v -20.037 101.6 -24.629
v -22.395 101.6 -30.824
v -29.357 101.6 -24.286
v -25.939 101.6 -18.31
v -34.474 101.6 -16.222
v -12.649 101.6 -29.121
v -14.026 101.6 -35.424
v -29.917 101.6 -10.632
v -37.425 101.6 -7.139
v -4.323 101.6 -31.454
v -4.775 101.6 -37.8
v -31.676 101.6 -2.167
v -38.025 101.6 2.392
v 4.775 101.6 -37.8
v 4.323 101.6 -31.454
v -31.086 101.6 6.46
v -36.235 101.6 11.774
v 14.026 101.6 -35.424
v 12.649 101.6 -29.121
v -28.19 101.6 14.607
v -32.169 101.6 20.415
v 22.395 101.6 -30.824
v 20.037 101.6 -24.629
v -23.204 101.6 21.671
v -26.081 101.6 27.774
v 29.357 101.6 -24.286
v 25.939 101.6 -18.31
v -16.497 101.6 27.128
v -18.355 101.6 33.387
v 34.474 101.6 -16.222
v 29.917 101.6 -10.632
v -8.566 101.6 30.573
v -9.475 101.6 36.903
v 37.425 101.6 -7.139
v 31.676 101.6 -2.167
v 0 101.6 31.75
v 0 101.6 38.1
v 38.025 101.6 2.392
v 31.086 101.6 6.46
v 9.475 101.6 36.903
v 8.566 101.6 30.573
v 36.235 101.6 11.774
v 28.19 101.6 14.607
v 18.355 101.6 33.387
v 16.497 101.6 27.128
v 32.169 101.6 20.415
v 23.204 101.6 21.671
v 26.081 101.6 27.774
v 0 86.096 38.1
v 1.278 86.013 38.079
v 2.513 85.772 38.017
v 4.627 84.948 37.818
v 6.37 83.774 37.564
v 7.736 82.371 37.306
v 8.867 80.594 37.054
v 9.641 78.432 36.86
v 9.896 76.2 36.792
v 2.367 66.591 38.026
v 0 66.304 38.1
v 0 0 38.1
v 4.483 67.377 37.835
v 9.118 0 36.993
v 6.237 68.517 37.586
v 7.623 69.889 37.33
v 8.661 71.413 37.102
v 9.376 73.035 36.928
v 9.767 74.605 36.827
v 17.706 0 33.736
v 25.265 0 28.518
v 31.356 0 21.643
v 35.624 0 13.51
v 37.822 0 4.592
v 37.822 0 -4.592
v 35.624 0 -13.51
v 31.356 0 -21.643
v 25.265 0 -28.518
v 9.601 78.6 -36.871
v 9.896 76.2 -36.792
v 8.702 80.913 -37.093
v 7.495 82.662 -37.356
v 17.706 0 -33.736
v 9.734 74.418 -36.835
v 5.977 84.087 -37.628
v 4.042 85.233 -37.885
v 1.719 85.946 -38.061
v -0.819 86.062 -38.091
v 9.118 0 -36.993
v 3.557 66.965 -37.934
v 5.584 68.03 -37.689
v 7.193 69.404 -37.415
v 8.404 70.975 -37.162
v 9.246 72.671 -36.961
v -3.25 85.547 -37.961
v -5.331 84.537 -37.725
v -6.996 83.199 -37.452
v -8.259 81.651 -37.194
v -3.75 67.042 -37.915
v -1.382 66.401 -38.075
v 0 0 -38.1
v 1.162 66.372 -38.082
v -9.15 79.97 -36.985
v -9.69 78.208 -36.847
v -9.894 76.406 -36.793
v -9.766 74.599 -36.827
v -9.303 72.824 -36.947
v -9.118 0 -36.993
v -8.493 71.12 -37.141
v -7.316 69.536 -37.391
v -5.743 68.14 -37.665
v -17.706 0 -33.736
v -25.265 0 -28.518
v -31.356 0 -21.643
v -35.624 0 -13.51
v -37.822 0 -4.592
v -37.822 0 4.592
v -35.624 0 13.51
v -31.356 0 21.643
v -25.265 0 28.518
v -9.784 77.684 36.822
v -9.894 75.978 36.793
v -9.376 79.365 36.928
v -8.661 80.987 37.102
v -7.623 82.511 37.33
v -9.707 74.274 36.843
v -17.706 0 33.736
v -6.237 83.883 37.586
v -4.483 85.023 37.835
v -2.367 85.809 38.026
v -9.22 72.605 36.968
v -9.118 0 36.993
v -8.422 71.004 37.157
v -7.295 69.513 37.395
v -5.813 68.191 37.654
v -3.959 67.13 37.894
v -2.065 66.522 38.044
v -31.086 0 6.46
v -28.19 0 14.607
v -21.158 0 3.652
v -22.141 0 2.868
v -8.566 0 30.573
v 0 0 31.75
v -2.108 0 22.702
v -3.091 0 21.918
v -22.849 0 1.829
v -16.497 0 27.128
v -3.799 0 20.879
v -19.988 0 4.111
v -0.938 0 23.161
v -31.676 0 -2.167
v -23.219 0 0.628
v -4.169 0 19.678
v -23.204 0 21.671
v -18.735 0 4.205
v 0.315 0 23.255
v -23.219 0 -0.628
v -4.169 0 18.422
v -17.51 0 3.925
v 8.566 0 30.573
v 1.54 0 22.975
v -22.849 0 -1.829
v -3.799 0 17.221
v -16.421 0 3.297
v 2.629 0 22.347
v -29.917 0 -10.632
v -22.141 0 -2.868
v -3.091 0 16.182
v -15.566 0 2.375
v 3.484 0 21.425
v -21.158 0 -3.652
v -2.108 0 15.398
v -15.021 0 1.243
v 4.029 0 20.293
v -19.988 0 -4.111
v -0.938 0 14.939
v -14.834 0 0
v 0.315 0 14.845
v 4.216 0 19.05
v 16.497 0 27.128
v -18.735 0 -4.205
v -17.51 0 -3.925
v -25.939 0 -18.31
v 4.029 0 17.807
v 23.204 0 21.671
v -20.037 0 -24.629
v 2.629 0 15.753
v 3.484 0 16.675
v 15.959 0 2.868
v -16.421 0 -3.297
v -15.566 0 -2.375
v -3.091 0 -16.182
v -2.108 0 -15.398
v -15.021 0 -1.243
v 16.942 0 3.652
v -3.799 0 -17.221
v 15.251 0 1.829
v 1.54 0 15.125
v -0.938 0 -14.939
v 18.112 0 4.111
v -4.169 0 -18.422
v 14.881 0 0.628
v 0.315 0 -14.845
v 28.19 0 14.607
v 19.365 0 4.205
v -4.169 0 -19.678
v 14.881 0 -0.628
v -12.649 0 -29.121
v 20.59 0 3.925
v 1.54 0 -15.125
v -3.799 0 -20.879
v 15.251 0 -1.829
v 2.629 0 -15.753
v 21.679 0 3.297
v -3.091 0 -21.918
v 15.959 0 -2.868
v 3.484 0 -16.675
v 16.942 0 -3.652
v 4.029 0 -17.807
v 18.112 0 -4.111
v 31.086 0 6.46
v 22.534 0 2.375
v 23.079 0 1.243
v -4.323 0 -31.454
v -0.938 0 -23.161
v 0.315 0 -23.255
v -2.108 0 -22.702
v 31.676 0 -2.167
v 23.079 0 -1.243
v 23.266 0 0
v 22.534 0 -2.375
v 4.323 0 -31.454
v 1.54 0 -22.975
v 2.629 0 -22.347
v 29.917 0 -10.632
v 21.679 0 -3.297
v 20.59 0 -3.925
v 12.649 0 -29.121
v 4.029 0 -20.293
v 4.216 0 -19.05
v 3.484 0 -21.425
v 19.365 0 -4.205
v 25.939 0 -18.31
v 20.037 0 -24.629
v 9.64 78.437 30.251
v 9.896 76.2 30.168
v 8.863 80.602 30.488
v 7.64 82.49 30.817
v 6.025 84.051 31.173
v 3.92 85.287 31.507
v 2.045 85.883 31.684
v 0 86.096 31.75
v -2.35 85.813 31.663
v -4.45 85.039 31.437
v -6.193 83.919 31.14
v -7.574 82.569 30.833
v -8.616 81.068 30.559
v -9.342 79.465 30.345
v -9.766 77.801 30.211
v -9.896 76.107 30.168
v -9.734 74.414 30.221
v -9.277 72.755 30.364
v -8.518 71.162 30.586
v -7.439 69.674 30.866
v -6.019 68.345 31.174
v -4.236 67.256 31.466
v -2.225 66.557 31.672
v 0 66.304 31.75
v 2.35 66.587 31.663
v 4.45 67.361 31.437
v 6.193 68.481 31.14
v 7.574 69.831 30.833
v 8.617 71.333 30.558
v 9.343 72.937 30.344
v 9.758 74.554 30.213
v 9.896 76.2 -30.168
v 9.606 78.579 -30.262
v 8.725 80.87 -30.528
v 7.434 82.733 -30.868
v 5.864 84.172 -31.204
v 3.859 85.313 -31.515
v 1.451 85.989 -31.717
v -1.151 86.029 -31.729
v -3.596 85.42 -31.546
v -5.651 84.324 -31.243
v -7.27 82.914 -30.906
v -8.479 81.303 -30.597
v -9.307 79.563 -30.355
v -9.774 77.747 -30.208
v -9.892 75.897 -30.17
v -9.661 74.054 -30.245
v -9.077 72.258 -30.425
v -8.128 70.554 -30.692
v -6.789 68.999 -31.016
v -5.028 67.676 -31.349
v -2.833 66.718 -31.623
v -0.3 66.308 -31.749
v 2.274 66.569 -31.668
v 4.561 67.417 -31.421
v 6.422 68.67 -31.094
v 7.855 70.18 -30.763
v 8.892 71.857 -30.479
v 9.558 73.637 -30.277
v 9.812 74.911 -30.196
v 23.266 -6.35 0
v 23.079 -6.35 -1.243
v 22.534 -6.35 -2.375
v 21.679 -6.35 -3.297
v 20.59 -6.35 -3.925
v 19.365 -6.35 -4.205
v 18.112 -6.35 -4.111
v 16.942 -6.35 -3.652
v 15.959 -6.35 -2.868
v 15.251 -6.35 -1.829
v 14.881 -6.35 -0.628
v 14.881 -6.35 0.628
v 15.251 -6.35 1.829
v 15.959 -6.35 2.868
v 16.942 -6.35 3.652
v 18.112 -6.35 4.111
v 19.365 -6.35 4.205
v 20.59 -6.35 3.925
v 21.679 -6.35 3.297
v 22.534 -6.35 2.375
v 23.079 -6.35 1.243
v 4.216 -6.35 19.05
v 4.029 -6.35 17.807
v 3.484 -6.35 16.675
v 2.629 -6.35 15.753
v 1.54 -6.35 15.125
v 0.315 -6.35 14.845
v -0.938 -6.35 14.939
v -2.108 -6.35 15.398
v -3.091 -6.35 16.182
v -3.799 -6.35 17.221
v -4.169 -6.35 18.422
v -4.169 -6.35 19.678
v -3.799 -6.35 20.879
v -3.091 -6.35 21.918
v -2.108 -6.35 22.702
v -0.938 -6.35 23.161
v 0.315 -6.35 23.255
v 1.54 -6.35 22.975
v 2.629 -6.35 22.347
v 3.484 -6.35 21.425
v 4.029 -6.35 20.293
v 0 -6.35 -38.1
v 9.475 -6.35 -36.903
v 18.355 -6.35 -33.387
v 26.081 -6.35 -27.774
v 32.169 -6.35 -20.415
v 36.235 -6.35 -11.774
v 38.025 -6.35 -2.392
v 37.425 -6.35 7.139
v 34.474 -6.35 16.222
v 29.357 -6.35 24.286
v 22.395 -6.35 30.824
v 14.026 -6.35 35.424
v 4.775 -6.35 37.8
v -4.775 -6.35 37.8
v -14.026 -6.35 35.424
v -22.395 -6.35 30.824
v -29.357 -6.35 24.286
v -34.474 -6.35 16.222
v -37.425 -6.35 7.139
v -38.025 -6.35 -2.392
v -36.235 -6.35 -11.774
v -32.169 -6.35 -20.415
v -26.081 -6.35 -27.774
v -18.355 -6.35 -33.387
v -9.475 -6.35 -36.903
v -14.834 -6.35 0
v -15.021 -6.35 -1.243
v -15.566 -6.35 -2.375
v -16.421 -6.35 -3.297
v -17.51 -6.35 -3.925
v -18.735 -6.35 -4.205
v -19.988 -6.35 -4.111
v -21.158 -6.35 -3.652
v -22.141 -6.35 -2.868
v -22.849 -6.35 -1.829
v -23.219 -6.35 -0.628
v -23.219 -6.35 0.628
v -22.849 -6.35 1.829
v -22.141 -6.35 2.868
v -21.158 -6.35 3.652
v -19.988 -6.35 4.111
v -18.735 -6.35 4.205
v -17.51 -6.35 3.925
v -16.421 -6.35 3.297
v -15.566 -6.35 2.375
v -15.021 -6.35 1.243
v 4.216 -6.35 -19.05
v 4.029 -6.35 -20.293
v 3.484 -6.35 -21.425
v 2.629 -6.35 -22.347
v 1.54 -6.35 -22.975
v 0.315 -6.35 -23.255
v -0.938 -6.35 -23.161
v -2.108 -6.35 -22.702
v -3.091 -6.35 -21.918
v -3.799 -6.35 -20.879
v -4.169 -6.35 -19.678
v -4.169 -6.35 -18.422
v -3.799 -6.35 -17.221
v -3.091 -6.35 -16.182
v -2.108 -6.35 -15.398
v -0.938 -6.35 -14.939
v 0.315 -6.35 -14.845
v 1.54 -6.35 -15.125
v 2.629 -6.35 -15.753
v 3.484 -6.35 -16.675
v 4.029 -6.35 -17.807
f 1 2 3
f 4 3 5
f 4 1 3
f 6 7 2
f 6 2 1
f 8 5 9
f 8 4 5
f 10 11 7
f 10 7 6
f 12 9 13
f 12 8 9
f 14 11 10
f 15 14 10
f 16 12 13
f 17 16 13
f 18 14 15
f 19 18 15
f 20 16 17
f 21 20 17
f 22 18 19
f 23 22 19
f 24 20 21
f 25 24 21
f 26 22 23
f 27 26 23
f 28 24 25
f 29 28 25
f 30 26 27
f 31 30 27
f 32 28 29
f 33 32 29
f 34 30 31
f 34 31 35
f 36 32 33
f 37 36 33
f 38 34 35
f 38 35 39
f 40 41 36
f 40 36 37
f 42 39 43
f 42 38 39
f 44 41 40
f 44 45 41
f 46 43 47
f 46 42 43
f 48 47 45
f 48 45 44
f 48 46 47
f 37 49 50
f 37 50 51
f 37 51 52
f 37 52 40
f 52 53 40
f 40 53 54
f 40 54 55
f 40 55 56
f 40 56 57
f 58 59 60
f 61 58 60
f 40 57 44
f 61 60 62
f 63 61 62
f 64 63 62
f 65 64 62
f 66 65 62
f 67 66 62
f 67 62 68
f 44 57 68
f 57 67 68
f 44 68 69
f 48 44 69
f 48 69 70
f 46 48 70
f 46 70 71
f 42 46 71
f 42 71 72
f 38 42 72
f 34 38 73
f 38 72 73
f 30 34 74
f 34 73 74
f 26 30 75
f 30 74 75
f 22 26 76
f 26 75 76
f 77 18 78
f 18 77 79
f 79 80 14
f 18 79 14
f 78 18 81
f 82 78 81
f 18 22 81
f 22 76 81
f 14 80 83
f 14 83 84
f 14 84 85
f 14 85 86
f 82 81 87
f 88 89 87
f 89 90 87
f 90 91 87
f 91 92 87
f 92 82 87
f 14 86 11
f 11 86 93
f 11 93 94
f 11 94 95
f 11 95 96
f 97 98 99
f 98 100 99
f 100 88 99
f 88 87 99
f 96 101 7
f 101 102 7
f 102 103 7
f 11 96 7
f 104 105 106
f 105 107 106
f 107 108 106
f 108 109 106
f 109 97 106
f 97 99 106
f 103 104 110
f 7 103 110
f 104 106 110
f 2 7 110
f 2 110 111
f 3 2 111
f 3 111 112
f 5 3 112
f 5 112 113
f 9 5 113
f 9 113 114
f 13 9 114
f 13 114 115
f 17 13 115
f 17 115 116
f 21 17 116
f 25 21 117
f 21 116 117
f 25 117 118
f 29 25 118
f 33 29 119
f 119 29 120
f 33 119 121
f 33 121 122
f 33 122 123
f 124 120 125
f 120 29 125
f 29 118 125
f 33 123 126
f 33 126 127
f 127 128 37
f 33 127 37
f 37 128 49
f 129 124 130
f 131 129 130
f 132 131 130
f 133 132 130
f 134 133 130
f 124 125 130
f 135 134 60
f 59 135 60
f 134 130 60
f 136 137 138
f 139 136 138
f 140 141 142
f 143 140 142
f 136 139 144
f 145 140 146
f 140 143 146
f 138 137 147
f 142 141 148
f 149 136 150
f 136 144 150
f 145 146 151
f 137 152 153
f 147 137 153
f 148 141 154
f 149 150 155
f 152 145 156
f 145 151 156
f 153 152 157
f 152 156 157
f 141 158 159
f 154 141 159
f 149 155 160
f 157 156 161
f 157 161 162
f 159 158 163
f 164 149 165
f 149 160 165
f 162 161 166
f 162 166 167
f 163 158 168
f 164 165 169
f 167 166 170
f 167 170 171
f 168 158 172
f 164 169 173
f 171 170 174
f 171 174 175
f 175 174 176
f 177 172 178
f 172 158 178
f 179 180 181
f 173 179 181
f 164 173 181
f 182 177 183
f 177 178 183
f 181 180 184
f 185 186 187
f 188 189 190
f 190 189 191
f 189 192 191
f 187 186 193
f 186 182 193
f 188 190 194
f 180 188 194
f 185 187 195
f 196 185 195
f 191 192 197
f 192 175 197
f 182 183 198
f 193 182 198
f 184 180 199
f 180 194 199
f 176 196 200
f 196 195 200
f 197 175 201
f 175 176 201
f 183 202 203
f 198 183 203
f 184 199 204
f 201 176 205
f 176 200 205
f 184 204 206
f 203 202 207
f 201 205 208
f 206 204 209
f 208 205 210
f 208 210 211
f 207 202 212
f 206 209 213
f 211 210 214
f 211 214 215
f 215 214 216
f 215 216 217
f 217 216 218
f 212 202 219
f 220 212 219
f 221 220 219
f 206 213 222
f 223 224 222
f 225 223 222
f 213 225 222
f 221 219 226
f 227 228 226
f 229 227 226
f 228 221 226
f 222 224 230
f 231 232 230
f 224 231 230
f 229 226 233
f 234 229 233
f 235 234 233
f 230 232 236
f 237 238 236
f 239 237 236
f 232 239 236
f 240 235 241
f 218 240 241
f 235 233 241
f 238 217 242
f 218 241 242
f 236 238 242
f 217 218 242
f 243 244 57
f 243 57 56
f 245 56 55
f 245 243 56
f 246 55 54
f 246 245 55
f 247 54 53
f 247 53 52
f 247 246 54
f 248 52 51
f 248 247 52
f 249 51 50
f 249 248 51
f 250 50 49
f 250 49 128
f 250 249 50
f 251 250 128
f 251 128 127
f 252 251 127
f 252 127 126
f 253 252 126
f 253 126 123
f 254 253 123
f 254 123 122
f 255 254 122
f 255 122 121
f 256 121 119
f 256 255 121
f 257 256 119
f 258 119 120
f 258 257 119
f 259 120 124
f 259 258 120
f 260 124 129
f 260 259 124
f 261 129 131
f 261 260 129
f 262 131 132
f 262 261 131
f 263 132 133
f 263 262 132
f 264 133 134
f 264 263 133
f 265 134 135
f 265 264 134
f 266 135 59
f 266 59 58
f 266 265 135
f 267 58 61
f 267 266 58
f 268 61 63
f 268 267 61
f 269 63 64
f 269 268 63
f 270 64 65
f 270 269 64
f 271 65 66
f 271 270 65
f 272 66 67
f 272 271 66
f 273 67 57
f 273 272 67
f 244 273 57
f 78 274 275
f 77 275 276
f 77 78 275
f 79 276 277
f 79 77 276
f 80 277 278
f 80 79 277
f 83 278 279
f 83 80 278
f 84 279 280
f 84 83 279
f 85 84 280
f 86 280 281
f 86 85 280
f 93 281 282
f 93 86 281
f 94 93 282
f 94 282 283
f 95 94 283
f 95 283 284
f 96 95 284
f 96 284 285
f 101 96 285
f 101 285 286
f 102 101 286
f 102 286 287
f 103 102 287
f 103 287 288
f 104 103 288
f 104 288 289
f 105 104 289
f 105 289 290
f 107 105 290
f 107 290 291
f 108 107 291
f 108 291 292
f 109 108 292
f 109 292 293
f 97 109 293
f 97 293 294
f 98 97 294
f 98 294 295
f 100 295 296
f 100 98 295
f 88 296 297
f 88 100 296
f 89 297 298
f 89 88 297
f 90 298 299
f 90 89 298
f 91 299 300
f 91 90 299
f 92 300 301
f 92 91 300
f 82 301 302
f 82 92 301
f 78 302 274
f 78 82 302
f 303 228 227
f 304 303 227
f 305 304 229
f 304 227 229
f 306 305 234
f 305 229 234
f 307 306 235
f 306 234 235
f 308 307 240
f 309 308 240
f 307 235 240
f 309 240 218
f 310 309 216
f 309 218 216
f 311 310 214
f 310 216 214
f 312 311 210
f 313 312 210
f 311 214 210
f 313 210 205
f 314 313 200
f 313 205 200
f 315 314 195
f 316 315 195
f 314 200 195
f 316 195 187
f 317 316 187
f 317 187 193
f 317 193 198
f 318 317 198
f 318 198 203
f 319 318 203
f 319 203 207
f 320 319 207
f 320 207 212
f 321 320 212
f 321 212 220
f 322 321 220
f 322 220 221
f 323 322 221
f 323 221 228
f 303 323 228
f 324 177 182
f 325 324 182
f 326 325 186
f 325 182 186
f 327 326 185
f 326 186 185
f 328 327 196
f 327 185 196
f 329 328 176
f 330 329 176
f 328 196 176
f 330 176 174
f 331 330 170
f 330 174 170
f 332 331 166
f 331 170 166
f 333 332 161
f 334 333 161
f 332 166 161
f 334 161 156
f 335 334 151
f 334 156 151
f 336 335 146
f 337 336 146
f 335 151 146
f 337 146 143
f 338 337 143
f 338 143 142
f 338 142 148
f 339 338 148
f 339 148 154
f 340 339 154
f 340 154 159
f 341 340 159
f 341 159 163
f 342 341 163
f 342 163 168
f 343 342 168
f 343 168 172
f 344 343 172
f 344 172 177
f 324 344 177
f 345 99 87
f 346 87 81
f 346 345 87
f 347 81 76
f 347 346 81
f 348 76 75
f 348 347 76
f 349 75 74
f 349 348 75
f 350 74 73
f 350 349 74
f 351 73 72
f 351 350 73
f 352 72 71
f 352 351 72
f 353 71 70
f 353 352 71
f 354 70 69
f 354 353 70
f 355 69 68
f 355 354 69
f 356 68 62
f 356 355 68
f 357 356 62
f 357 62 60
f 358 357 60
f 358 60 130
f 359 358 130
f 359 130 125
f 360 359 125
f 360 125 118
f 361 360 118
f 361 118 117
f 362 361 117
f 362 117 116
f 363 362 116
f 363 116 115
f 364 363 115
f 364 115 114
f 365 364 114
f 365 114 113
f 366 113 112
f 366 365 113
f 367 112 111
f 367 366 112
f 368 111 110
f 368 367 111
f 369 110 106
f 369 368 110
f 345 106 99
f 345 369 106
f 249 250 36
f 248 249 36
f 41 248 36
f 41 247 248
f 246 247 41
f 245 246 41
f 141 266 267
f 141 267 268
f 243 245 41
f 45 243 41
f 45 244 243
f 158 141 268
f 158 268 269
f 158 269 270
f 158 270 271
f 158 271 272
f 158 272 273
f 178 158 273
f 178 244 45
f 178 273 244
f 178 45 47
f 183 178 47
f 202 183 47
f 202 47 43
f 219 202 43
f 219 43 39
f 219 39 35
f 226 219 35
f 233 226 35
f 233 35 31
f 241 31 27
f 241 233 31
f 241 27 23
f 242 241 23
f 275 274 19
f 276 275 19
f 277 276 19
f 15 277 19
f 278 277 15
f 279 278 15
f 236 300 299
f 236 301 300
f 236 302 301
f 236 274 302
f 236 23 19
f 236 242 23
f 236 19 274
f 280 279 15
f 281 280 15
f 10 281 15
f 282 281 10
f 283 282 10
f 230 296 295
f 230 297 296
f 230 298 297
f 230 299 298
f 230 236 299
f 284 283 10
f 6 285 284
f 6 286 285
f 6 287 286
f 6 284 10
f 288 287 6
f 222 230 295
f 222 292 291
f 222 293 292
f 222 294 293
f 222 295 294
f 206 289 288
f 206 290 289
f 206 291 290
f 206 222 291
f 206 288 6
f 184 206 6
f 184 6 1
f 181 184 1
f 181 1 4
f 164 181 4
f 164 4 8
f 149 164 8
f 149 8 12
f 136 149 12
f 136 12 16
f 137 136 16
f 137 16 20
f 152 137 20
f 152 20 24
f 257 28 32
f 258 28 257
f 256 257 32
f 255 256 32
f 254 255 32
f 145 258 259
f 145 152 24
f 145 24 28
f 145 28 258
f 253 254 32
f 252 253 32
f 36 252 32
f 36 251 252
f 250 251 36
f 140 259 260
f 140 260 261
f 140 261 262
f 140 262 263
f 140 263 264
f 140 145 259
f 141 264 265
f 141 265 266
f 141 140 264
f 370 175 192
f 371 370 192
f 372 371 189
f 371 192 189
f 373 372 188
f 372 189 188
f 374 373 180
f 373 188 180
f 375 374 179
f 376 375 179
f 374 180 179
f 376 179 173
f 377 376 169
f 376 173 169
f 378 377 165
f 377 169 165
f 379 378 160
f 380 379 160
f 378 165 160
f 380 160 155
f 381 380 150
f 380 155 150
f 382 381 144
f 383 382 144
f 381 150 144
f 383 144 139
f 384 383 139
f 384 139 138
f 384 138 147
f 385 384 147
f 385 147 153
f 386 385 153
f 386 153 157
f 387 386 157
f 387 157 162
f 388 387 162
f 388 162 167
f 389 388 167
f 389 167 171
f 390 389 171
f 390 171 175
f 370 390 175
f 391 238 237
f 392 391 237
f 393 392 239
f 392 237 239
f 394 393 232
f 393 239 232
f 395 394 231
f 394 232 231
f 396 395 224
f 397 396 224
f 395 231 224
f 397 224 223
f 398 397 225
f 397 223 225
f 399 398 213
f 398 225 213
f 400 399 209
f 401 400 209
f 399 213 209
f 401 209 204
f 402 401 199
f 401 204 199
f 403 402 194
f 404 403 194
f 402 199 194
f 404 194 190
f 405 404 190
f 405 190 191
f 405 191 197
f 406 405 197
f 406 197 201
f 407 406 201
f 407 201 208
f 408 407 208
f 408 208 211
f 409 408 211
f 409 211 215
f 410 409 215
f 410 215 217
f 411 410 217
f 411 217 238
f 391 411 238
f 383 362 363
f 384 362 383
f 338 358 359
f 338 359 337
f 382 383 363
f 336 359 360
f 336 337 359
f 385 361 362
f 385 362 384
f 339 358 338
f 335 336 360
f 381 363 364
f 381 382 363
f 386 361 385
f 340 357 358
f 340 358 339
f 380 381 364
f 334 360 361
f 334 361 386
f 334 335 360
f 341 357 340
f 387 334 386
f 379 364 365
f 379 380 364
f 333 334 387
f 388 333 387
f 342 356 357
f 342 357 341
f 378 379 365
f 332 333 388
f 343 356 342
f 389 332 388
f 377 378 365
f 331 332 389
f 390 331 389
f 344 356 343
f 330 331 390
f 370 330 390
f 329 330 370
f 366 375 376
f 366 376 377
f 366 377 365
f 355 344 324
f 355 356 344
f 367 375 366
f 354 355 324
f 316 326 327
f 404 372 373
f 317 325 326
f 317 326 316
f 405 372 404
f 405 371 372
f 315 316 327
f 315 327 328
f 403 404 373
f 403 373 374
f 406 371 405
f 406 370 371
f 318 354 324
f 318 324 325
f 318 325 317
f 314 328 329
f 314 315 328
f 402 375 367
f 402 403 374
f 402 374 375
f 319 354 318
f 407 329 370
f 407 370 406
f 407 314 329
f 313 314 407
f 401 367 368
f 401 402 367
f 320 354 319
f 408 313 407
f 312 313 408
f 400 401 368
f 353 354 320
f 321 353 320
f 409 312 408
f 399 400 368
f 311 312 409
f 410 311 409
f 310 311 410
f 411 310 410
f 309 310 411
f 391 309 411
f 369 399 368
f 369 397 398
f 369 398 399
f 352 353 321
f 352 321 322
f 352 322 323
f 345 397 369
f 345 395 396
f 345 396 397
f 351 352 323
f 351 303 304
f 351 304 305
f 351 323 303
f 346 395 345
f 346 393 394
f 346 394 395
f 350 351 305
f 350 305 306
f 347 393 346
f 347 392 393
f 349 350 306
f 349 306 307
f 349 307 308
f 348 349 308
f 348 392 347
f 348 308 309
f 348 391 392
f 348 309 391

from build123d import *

# Parameters (mm, degrees)
SKETCH1_R                   = 38.1
SKETCH1_R_2                 = 31.75
BOSS_EXTRUDE1_DEPTH         = 101.6
BOSS_EXTRUDE2_START         = 6.35
SKETCH2_R                   = 38.1
BOSS_EXTRUDE2_DEPTH         = 6.35
F_3_8_24_TAPPED_HOLE1_D     = 8.4328
F_3_8_24_TAPPED_HOLE1_DEPTH = 22.352
F_3_8_24_TAPPED_HOLE1_TIP   = 2.533468714
CUT_EXTRUDE1_DEPTH          = 116.003391254
CUT_EXTRUDE1_DEPTH_BACK     = 116.003391254
SKETCH8_R                   = 9.896133373


with BuildPart() as part:
    # Sketch1 → Boss-Extrude1 (new body)
    with BuildSketch(Plane(origin=(0, 0, 0), x_dir=(1, 0, 0), z_dir=(0, 1, 0))):
        with Locations(Location((0, 0, 0), (0, 0, 270))):
            Circle(SKETCH1_R)
        with Locations(Location((0, 0, 0), (0, 0, 270))):
            Circle(SKETCH1_R_2, mode=Mode.SUBTRACT)
    extrude(amount=BOSS_EXTRUDE1_DEPTH)

    # Sketch2 → Boss-Extrude2 (add)
    with BuildSketch(Plane.XZ.offset(BOSS_EXTRUDE2_START)):
        with Locations(Location((0, 0, 0), (0, 0, 270))):
            Circle(SKETCH2_R)
    extrude(amount=-BOSS_EXTRUDE2_DEPTH)

    # 3/8-24 Tapped Hole1
    with Locations(Plane(origin=(0, -6.35, 0), x_dir=(-1, 0, 0), z_dir=(0, -1, 0))):
        with Locations((0, -19.05), (19.05, 0), (0, 19.05), (-19.05, 0)):
            Hole(F_3_8_24_TAPPED_HOLE1_D / 2, depth=F_3_8_24_TAPPED_HOLE1_DEPTH)
            with Locations((0, 0, -(F_3_8_24_TAPPED_HOLE1_DEPTH + F_3_8_24_TAPPED_HOLE1_TIP / 2))):  # 118° drill point
                Cone(0, F_3_8_24_TAPPED_HOLE1_D / 2, F_3_8_24_TAPPED_HOLE1_TIP, mode=Mode.SUBTRACT)

    # Sketch8 → Cut-Extrude1 (cut, two sides: drawn at the far end of the back side and taken through both)
    with BuildSketch(Plane.XY.offset(-CUT_EXTRUDE1_DEPTH_BACK)):
        with Locations((0, 76.2)):
            Circle(SKETCH8_R)
    extrude(amount=CUT_EXTRUDE1_DEPTH + CUT_EXTRUDE1_DEPTH_BACK, mode=Mode.SUBTRACT)


solid = part.part
